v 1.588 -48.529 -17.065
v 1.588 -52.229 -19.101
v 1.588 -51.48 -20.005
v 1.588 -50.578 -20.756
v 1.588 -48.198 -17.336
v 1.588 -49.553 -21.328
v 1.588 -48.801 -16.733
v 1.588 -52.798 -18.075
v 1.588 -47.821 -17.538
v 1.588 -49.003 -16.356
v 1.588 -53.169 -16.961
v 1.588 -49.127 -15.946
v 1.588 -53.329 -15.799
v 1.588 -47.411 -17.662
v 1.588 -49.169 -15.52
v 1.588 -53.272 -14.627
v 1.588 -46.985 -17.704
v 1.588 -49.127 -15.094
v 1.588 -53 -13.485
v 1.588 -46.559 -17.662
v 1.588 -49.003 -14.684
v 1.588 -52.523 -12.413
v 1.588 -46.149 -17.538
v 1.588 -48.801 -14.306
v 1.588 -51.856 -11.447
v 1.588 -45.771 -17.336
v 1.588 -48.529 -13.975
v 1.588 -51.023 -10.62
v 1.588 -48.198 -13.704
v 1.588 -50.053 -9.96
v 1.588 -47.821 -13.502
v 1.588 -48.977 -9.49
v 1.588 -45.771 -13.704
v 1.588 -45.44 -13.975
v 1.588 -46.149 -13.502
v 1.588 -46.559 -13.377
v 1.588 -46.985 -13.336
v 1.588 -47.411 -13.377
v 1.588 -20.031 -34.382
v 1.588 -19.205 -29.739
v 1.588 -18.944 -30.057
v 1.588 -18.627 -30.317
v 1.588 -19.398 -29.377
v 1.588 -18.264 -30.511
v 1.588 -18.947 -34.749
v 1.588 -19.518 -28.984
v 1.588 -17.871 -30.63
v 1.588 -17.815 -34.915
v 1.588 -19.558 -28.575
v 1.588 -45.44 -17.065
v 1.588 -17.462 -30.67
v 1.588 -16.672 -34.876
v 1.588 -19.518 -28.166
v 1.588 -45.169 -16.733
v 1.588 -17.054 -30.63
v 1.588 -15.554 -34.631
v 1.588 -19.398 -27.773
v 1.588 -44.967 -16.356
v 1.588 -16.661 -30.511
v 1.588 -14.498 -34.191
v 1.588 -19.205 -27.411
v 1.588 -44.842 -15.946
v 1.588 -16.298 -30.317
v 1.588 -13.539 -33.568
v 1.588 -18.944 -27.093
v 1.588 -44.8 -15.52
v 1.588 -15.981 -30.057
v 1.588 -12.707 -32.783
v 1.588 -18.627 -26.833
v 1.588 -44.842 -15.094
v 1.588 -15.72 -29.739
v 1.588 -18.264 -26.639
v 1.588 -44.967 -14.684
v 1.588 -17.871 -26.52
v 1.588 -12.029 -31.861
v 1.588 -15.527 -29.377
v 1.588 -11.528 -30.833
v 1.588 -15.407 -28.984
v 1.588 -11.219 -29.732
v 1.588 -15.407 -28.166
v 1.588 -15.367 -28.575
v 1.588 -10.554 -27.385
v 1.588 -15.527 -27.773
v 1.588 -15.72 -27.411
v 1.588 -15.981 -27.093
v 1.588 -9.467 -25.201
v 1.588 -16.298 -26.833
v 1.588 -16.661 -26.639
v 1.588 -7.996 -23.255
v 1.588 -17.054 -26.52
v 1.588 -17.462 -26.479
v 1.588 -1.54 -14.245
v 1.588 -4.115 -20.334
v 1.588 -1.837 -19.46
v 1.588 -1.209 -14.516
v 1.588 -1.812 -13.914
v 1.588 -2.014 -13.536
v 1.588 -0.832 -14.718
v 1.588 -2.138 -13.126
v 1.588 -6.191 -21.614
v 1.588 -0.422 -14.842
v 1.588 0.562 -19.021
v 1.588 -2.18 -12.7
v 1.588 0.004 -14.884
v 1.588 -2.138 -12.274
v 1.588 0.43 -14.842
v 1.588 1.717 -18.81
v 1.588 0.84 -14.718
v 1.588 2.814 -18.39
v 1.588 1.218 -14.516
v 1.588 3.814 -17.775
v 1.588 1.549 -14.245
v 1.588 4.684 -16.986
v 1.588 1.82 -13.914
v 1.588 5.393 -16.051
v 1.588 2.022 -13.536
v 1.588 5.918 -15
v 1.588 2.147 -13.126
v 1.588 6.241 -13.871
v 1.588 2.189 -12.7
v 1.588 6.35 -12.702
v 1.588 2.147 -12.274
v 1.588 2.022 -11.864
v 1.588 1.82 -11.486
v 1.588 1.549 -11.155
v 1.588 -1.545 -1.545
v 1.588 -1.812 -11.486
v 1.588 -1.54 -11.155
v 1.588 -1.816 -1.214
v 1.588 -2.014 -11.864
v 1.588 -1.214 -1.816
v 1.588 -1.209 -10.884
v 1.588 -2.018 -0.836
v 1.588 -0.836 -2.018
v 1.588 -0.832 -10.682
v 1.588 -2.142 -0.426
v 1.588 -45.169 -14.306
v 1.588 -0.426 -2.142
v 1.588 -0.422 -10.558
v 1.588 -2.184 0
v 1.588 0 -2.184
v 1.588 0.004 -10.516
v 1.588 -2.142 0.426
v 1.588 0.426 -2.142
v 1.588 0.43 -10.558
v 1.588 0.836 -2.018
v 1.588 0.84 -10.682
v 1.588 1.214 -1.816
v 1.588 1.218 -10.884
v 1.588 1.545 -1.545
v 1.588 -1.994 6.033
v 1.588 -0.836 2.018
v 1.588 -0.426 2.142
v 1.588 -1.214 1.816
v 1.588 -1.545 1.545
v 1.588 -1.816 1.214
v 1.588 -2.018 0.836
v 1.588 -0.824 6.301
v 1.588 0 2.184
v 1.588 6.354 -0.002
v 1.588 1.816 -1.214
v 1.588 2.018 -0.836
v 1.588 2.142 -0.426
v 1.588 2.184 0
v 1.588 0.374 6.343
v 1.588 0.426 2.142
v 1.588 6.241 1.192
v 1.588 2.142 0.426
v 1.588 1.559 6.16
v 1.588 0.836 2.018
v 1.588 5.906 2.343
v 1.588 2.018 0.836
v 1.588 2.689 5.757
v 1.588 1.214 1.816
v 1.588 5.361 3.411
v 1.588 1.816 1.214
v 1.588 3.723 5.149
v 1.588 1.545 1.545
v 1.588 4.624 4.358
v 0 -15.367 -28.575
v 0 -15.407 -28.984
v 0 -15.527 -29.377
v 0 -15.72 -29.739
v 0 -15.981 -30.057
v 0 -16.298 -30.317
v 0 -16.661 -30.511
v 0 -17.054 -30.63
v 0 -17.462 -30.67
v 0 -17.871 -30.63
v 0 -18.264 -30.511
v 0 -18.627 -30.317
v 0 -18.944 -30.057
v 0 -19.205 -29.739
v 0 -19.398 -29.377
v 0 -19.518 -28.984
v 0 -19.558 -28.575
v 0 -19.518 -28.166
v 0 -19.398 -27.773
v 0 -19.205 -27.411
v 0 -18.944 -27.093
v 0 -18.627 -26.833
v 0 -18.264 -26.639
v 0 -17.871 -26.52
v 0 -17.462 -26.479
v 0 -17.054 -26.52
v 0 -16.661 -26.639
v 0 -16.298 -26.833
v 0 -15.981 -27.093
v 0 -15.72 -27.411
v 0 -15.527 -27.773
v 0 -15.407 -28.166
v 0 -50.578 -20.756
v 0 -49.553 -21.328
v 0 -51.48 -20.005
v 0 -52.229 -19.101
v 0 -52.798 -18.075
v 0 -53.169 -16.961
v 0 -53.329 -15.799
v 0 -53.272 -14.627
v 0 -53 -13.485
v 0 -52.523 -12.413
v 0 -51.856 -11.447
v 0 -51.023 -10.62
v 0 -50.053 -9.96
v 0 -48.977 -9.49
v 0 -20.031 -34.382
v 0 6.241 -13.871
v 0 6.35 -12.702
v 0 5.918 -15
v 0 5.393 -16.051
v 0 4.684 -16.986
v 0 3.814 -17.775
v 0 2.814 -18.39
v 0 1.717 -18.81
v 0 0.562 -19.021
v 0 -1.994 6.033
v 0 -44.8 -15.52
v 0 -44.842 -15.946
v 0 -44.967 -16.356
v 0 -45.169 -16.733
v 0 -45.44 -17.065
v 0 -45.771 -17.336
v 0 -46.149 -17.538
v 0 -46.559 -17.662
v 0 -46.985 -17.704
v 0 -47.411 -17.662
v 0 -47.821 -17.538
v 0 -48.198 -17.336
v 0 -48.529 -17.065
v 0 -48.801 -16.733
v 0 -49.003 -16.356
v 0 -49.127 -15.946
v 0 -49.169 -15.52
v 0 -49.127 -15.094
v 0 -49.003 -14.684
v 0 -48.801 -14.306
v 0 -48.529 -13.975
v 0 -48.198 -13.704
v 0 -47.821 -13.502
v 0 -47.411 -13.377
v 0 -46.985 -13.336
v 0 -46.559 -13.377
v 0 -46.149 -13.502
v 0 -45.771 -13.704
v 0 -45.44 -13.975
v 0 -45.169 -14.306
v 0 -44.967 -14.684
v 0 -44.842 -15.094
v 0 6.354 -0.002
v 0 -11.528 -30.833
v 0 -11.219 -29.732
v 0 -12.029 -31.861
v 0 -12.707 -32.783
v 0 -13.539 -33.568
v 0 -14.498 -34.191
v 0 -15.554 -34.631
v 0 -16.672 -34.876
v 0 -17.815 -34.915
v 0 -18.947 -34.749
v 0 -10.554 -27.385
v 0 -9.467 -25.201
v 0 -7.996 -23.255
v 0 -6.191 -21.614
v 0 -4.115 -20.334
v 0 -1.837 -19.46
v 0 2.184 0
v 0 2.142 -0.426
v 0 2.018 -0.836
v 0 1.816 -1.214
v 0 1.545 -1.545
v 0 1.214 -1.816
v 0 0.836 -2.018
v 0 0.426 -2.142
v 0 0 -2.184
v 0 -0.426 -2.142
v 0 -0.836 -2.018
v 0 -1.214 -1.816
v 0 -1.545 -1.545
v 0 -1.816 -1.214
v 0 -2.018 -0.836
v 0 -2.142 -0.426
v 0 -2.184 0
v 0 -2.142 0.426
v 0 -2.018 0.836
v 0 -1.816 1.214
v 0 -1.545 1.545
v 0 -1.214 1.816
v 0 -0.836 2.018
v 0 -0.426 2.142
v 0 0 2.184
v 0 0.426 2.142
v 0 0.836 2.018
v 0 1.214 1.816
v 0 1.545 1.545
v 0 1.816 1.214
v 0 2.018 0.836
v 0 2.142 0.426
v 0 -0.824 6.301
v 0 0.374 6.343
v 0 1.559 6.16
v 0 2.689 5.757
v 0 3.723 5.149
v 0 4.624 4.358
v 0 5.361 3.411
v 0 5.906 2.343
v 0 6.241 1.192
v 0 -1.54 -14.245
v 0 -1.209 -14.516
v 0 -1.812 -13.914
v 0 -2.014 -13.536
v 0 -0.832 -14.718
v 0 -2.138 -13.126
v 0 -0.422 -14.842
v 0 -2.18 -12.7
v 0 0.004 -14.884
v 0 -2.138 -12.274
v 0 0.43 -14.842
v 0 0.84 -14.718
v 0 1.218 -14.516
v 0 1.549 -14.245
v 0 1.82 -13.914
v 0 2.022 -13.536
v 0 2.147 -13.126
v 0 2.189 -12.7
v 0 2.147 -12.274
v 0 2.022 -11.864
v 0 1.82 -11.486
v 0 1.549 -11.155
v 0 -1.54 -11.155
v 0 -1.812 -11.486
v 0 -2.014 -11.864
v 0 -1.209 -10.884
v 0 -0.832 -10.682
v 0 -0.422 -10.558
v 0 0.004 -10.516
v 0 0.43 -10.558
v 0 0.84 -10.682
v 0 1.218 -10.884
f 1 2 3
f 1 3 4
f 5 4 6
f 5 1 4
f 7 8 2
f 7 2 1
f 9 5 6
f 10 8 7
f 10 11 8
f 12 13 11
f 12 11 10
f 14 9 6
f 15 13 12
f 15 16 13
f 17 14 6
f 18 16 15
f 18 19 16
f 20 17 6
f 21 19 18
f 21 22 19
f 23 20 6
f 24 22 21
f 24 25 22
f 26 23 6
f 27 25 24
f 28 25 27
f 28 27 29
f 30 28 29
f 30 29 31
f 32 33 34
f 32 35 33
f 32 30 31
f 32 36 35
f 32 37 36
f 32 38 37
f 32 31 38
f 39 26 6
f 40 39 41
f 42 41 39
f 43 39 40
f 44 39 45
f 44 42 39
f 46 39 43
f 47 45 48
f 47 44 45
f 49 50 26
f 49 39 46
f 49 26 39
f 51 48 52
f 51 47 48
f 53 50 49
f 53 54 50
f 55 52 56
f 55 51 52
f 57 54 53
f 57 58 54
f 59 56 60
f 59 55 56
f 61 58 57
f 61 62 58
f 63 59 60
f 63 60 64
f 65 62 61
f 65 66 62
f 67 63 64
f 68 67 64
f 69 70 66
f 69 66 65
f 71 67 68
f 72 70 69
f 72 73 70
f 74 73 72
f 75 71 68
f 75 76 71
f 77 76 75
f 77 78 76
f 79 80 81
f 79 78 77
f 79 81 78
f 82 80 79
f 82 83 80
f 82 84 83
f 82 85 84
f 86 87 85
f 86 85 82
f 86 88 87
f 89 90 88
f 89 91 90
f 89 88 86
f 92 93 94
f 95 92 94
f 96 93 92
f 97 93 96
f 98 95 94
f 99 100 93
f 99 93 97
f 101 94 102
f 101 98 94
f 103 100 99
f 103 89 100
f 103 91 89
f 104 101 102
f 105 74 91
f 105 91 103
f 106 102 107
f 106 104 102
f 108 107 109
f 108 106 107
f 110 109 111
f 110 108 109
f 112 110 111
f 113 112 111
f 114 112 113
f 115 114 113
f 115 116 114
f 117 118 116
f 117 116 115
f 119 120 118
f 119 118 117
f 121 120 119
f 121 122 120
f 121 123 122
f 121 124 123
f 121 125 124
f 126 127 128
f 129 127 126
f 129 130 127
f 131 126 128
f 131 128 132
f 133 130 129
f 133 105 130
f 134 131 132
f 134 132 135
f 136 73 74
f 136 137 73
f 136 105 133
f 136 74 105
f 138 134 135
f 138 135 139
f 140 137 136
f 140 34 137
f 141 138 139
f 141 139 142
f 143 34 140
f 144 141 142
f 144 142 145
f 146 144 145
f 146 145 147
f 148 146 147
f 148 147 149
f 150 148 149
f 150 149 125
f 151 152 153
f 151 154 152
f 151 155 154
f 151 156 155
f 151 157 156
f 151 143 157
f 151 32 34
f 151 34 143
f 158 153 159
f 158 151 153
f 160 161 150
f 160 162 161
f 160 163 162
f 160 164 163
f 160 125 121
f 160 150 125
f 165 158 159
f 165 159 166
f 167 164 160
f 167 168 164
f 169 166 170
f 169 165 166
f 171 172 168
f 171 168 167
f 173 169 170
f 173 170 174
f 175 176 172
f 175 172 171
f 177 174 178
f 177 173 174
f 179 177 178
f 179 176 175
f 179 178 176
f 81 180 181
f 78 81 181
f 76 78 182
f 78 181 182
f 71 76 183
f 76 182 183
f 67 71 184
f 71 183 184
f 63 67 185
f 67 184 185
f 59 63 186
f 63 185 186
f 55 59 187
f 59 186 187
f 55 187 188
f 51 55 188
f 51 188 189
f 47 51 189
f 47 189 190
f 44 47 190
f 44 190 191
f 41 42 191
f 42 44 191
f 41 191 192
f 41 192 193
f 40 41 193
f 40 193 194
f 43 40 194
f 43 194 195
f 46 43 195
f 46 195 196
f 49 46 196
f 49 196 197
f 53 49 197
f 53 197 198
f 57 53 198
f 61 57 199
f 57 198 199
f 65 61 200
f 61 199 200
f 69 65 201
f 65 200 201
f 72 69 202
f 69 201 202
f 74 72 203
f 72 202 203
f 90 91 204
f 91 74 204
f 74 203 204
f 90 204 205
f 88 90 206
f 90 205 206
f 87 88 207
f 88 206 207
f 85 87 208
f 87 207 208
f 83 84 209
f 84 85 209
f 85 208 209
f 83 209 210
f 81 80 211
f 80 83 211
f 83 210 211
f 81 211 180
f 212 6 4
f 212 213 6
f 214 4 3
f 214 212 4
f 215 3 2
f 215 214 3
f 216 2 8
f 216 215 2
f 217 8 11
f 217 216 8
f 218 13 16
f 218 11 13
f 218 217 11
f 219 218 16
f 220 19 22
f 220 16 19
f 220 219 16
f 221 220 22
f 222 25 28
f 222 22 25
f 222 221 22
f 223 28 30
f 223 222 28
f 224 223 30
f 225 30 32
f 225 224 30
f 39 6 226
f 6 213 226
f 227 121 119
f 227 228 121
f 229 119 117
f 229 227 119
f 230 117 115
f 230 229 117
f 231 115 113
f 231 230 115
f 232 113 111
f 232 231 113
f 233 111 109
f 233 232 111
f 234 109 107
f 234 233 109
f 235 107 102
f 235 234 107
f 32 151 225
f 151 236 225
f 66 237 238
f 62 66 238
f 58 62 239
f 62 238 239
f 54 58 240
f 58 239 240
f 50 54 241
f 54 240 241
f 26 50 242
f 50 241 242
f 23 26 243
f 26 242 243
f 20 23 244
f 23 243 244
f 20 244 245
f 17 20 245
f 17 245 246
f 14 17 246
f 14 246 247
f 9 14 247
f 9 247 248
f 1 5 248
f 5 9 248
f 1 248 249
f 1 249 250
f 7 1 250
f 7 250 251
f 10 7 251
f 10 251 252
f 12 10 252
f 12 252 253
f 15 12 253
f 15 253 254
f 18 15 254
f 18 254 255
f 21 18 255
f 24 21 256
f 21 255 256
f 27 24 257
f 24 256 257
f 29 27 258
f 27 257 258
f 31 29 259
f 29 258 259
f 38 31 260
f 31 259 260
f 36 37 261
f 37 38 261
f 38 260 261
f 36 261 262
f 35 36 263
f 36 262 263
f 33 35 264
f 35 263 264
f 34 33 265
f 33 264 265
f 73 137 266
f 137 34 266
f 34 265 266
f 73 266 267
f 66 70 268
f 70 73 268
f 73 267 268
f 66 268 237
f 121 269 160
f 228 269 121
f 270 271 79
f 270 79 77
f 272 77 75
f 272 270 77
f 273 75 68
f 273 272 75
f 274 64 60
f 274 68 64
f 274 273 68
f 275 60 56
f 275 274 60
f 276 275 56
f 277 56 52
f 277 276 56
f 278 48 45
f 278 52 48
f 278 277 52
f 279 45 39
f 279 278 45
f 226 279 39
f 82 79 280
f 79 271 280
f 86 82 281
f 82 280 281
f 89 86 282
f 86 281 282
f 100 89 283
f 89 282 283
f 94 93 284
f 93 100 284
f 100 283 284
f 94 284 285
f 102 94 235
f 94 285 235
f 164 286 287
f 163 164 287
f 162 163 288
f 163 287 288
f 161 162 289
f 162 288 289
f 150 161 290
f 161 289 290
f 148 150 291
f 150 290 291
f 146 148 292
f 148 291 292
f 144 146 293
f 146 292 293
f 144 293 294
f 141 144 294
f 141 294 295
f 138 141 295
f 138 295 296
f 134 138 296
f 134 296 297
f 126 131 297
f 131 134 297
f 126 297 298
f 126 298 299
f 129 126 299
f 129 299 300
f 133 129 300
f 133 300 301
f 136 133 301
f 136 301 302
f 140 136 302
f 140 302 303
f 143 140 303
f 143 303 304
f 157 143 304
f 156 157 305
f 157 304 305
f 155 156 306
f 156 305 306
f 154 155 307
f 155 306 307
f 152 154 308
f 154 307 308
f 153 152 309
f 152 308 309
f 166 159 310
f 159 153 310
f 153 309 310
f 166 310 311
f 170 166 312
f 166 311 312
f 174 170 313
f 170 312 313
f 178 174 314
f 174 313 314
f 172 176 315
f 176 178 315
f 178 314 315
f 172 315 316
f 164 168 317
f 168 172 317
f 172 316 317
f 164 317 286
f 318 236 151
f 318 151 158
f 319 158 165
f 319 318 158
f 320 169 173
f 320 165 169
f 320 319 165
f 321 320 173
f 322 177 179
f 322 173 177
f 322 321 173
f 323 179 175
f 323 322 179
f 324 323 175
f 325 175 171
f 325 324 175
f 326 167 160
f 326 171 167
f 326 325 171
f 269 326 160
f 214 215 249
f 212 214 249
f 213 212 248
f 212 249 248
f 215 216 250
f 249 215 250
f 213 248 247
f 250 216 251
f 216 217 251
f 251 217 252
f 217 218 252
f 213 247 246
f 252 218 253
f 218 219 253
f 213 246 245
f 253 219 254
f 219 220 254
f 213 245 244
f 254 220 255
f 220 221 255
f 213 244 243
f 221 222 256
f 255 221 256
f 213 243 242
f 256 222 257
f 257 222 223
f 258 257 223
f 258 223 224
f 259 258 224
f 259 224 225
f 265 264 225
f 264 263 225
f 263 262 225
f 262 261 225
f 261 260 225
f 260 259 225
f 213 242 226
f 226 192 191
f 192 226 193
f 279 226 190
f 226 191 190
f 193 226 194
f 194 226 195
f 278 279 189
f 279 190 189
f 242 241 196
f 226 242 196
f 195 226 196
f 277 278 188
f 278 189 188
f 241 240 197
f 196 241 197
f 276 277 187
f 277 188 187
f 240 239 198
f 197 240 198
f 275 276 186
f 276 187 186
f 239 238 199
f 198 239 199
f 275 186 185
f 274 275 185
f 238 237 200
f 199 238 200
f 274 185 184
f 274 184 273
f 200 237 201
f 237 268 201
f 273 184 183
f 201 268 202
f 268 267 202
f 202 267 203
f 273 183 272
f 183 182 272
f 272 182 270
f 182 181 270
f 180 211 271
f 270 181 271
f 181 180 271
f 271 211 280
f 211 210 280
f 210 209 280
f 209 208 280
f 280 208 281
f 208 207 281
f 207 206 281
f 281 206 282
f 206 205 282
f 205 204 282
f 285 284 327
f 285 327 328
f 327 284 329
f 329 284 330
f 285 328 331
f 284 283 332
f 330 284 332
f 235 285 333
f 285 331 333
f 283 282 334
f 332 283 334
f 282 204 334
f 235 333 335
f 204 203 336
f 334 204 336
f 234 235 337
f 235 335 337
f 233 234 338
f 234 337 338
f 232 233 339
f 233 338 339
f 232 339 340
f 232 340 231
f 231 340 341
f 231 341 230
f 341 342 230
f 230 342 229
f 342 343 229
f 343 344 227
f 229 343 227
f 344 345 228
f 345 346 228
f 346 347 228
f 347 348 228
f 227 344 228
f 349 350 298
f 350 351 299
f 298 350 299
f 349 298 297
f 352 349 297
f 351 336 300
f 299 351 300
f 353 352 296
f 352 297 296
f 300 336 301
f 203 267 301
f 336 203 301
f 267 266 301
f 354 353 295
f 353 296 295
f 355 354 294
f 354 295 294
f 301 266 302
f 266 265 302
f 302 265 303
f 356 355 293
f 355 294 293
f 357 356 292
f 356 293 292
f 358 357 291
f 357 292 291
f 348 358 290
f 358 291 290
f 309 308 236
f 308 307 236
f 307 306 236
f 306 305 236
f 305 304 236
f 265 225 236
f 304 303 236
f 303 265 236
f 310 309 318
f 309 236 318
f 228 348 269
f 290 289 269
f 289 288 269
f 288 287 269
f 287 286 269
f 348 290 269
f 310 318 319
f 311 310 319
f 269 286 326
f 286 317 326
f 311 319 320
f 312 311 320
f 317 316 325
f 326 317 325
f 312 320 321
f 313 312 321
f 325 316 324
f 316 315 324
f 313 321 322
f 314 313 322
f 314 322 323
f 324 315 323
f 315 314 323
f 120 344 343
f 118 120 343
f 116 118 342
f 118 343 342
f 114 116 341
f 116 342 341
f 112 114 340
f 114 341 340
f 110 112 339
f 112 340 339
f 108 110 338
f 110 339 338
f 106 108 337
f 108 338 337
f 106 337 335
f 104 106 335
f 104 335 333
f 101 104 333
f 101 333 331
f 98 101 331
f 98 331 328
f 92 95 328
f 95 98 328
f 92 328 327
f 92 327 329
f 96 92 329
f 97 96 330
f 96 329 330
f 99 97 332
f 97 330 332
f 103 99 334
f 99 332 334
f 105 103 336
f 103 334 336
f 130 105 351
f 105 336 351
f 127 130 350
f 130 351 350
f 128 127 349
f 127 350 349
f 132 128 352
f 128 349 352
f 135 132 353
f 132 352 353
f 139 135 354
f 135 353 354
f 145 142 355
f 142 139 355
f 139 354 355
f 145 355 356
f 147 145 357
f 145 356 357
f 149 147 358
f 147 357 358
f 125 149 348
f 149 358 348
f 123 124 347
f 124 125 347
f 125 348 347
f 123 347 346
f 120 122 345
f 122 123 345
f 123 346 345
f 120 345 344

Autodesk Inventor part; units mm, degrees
ref_plane "YZ Plane" through (0, 0, 0) normal (1, 0, 0) x (0, 1, 0)
ref_plane "XZ Plane" through (0, 0, 0) normal (0, 1, 0) x (-1, 0, 0)
ref_plane "XY Plane" through (0, 0, 0) normal (0, 0, 1) x (1, 0, 0)
sketch "maiin" plane through (0, 0, 0) normal (0, 0, 1) x (1, 0, 0)
  circle A0 centre (-0.0182, -20.0228) radius 2.1844
  circle A1 centre (12.6818, -20.0228) radius 2.1844
  circle A2 centre (-2.8225, 26.9672) radius 2.1844 construction
  arc A3 (-6.3396, -20.5787) -> (-0.0224, -26.3686) centre (-0.0182, -20.0228) ccw
  arc A4 (12.6776, -26.377) -> (18.7159, -18.0313) centre (12.6818, -20.0228) ccw
  arc A5 (3.2076, 28.9574) -> (-8.6291, 29.5373) centre (-2.8225, 26.9672) ccw
  arc A6 (-21.694, 0.0193) -> (-17.0461, -8.7942) centre (-15.8874, -2.5508) ccw
  circle A7 centre (-15.8874, -2.5508) radius 2.0955
  line L0 (18.7159, -18.0313) -> (3.2076, 28.9574)
  line L1 (12.6776, -26.377) -> (-0.0224, -26.3686)
  line L2 (-8.6291, 29.5373) -> (-21.694, 0.0193)
  circle A8 centre (-2.8225, 26.9672) radius 2.1844
  arc A9 (-6.3396, -20.5787) -> (-17.0461, -8.7942) centre (-19.447, -21.7313) ccw
  point P0 (3.1417, -3.9392)
  dimension "d0" = 12.7
  dimension "d1" = 12.7
  dimension "d2" = 4.191
  dimension "d3" = 4.3688
  dimension "d7" = 46.99
sketch "Sketch1" plane through (0, 0, 0) normal (1, 0, 0) x (0, 1, 0)
  circle A0 centre (0.0042, -12.7) radius 2.1844
  circle A1 centre (0, 0) radius 2.1844
  circle A2 centre (-46.9848, -15.5199) radius 2.1844 construction
  arc A3 (0.5622, -19.0212) -> (6.35, -12.7021) centre (0.0042, -12.7) ccw
  arc A4 (6.3542, -0.0021) -> (-1.9935, 6.0334) centre (0, 0) ccw
  arc A5 (-48.977, -9.4905) -> (-49.553, -21.3275) centre (-46.9848, -15.5199) ccw
  arc A6 (-20.0306, -34.3825) -> (-11.2187, -29.7316) centre (-17.4625, -28.575) ccw
  circle A7 centre (-17.4625, -28.575) radius 2.0955
  line L0 (-1.9935, 6.0334) -> (-48.977, -9.4905)
  line L1 (6.3542, -0.0021) -> (6.35, -12.7021)
  line L2 (-49.553, -21.3275) -> (-20.0306, -34.3825)
  circle A8 centre (-46.9848, -15.5199) radius 2.1844
  arc A9 (0.5622, -19.0212) -> (-11.2187, -29.7316) centre (1.7192, -32.1283) ccw
  point P0 (0, 0)
extrude "Extrusion1" add sketch "Sketch1" along normal blind 1.5875
properties part number "bottom_joint_gusset"
